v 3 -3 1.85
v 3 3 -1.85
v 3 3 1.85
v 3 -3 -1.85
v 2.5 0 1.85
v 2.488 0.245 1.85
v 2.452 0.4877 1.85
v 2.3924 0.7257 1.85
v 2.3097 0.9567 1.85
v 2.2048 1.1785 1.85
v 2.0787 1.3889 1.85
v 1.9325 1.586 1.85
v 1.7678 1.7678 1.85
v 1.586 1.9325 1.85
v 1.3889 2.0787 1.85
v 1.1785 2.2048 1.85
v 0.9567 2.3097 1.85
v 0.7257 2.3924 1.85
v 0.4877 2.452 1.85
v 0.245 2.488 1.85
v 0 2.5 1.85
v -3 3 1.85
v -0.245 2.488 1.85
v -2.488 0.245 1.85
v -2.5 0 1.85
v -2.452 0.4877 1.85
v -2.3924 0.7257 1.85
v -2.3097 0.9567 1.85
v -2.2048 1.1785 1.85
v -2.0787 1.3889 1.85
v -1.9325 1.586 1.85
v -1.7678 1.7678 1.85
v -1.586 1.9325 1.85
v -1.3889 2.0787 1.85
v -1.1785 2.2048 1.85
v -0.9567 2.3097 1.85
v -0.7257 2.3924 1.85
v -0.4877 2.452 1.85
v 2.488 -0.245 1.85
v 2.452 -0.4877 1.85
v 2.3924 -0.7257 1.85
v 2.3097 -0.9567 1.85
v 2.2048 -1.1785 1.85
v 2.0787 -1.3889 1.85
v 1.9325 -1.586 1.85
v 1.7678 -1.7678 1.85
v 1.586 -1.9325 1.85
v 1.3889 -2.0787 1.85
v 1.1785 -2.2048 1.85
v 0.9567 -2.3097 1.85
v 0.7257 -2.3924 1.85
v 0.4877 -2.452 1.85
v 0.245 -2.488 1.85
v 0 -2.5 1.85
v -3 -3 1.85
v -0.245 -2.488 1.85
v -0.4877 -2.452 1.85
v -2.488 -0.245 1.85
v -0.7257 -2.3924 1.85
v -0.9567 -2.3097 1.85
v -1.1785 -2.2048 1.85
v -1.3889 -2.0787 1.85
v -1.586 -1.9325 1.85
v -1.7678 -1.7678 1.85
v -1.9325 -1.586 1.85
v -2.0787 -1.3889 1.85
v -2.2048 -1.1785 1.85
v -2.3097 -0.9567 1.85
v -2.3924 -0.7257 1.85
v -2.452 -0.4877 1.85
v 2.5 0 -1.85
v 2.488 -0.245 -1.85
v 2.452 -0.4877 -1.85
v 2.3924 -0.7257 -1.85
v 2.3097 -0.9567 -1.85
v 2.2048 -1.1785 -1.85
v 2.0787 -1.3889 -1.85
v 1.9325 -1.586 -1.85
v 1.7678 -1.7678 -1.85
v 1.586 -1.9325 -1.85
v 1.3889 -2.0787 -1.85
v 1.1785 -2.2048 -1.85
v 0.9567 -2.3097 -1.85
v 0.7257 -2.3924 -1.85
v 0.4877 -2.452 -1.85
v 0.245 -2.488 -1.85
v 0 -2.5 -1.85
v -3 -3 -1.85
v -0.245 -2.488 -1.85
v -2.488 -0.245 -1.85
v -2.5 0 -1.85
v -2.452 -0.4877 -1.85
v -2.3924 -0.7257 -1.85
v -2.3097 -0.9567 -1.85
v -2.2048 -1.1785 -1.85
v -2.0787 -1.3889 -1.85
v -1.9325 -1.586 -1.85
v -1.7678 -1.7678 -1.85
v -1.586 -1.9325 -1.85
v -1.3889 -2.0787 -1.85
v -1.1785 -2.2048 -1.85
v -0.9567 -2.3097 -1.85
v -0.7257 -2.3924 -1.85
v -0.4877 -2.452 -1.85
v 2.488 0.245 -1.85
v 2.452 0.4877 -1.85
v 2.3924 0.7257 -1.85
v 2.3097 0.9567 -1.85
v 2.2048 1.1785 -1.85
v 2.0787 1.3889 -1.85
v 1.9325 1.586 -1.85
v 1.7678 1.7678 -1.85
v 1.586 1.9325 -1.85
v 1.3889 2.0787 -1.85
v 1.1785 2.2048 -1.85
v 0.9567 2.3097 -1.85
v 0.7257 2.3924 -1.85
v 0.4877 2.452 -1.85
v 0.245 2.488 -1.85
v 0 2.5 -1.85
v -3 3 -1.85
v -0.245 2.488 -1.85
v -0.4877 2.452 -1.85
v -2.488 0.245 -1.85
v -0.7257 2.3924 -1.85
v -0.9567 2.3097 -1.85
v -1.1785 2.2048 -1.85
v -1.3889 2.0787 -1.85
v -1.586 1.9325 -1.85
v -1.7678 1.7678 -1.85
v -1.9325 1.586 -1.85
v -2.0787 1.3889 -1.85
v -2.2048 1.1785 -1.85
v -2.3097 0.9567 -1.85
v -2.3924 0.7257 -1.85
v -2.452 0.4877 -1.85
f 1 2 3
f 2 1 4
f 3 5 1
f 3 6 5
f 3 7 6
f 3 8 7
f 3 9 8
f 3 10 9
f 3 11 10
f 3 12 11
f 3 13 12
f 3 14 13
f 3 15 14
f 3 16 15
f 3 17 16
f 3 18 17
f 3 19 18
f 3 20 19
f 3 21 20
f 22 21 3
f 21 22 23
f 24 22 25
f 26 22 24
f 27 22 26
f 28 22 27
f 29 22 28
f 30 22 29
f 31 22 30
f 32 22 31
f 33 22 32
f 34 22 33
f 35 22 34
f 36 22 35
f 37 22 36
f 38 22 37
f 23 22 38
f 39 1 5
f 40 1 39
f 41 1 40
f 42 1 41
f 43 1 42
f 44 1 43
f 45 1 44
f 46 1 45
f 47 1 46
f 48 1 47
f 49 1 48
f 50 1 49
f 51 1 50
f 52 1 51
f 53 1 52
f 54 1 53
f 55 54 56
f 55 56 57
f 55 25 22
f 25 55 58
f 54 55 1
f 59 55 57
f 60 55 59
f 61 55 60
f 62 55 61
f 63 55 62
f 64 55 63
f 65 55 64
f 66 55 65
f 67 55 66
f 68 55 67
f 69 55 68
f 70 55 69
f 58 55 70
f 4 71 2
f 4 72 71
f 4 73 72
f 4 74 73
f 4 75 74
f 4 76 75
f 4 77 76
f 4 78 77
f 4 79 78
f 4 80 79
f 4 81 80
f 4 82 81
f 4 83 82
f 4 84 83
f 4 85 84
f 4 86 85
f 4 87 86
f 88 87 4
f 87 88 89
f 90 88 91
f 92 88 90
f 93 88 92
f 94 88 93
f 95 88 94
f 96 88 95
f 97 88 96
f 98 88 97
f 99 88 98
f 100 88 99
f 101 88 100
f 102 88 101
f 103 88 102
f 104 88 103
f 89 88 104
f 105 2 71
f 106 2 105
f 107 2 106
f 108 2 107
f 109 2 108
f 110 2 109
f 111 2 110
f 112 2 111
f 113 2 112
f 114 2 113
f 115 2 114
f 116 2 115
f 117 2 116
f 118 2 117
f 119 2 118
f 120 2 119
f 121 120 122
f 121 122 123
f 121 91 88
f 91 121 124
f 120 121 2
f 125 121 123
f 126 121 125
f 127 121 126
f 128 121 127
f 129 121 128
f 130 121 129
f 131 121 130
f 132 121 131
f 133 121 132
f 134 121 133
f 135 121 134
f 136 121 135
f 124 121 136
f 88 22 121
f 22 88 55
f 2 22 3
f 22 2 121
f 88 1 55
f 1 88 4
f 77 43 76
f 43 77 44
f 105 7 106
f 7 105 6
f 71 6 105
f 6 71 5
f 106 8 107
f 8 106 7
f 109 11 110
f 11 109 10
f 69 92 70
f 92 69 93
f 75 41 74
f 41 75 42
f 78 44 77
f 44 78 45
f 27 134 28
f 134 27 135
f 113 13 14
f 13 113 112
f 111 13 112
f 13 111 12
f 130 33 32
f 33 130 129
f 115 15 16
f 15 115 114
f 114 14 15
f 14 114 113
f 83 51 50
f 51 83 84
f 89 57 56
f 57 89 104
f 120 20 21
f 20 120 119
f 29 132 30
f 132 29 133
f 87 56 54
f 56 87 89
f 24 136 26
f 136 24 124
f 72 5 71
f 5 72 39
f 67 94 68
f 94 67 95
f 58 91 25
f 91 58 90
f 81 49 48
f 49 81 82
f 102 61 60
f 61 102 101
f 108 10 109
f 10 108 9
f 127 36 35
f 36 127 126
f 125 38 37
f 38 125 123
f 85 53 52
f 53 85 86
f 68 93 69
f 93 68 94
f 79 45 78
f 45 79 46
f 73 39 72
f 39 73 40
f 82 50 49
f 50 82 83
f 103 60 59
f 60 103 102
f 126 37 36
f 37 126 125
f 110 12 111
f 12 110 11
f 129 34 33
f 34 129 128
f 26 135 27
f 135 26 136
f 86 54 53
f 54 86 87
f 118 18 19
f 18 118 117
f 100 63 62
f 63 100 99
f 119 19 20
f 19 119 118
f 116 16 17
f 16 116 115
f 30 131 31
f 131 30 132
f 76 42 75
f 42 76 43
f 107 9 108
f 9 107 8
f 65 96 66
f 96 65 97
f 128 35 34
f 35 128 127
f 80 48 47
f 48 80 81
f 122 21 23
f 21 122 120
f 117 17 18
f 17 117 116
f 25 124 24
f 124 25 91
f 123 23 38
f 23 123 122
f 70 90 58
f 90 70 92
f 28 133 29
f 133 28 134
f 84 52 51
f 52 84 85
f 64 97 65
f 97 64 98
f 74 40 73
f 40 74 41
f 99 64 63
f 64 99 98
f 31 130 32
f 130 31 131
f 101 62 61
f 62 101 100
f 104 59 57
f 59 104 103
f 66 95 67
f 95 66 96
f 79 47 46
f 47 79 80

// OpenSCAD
module t_slot_nut() {
    difference() {
        // Main body of the nut
        cube([6.0, 6.0, 3.7], center = true);
        
        // Hole for the screw
        translate([0, 0, -3.7/2])
            cylinder(h = 3.7, r = 2.5, $fn = 64);
    }
}

t_slot_nut();
